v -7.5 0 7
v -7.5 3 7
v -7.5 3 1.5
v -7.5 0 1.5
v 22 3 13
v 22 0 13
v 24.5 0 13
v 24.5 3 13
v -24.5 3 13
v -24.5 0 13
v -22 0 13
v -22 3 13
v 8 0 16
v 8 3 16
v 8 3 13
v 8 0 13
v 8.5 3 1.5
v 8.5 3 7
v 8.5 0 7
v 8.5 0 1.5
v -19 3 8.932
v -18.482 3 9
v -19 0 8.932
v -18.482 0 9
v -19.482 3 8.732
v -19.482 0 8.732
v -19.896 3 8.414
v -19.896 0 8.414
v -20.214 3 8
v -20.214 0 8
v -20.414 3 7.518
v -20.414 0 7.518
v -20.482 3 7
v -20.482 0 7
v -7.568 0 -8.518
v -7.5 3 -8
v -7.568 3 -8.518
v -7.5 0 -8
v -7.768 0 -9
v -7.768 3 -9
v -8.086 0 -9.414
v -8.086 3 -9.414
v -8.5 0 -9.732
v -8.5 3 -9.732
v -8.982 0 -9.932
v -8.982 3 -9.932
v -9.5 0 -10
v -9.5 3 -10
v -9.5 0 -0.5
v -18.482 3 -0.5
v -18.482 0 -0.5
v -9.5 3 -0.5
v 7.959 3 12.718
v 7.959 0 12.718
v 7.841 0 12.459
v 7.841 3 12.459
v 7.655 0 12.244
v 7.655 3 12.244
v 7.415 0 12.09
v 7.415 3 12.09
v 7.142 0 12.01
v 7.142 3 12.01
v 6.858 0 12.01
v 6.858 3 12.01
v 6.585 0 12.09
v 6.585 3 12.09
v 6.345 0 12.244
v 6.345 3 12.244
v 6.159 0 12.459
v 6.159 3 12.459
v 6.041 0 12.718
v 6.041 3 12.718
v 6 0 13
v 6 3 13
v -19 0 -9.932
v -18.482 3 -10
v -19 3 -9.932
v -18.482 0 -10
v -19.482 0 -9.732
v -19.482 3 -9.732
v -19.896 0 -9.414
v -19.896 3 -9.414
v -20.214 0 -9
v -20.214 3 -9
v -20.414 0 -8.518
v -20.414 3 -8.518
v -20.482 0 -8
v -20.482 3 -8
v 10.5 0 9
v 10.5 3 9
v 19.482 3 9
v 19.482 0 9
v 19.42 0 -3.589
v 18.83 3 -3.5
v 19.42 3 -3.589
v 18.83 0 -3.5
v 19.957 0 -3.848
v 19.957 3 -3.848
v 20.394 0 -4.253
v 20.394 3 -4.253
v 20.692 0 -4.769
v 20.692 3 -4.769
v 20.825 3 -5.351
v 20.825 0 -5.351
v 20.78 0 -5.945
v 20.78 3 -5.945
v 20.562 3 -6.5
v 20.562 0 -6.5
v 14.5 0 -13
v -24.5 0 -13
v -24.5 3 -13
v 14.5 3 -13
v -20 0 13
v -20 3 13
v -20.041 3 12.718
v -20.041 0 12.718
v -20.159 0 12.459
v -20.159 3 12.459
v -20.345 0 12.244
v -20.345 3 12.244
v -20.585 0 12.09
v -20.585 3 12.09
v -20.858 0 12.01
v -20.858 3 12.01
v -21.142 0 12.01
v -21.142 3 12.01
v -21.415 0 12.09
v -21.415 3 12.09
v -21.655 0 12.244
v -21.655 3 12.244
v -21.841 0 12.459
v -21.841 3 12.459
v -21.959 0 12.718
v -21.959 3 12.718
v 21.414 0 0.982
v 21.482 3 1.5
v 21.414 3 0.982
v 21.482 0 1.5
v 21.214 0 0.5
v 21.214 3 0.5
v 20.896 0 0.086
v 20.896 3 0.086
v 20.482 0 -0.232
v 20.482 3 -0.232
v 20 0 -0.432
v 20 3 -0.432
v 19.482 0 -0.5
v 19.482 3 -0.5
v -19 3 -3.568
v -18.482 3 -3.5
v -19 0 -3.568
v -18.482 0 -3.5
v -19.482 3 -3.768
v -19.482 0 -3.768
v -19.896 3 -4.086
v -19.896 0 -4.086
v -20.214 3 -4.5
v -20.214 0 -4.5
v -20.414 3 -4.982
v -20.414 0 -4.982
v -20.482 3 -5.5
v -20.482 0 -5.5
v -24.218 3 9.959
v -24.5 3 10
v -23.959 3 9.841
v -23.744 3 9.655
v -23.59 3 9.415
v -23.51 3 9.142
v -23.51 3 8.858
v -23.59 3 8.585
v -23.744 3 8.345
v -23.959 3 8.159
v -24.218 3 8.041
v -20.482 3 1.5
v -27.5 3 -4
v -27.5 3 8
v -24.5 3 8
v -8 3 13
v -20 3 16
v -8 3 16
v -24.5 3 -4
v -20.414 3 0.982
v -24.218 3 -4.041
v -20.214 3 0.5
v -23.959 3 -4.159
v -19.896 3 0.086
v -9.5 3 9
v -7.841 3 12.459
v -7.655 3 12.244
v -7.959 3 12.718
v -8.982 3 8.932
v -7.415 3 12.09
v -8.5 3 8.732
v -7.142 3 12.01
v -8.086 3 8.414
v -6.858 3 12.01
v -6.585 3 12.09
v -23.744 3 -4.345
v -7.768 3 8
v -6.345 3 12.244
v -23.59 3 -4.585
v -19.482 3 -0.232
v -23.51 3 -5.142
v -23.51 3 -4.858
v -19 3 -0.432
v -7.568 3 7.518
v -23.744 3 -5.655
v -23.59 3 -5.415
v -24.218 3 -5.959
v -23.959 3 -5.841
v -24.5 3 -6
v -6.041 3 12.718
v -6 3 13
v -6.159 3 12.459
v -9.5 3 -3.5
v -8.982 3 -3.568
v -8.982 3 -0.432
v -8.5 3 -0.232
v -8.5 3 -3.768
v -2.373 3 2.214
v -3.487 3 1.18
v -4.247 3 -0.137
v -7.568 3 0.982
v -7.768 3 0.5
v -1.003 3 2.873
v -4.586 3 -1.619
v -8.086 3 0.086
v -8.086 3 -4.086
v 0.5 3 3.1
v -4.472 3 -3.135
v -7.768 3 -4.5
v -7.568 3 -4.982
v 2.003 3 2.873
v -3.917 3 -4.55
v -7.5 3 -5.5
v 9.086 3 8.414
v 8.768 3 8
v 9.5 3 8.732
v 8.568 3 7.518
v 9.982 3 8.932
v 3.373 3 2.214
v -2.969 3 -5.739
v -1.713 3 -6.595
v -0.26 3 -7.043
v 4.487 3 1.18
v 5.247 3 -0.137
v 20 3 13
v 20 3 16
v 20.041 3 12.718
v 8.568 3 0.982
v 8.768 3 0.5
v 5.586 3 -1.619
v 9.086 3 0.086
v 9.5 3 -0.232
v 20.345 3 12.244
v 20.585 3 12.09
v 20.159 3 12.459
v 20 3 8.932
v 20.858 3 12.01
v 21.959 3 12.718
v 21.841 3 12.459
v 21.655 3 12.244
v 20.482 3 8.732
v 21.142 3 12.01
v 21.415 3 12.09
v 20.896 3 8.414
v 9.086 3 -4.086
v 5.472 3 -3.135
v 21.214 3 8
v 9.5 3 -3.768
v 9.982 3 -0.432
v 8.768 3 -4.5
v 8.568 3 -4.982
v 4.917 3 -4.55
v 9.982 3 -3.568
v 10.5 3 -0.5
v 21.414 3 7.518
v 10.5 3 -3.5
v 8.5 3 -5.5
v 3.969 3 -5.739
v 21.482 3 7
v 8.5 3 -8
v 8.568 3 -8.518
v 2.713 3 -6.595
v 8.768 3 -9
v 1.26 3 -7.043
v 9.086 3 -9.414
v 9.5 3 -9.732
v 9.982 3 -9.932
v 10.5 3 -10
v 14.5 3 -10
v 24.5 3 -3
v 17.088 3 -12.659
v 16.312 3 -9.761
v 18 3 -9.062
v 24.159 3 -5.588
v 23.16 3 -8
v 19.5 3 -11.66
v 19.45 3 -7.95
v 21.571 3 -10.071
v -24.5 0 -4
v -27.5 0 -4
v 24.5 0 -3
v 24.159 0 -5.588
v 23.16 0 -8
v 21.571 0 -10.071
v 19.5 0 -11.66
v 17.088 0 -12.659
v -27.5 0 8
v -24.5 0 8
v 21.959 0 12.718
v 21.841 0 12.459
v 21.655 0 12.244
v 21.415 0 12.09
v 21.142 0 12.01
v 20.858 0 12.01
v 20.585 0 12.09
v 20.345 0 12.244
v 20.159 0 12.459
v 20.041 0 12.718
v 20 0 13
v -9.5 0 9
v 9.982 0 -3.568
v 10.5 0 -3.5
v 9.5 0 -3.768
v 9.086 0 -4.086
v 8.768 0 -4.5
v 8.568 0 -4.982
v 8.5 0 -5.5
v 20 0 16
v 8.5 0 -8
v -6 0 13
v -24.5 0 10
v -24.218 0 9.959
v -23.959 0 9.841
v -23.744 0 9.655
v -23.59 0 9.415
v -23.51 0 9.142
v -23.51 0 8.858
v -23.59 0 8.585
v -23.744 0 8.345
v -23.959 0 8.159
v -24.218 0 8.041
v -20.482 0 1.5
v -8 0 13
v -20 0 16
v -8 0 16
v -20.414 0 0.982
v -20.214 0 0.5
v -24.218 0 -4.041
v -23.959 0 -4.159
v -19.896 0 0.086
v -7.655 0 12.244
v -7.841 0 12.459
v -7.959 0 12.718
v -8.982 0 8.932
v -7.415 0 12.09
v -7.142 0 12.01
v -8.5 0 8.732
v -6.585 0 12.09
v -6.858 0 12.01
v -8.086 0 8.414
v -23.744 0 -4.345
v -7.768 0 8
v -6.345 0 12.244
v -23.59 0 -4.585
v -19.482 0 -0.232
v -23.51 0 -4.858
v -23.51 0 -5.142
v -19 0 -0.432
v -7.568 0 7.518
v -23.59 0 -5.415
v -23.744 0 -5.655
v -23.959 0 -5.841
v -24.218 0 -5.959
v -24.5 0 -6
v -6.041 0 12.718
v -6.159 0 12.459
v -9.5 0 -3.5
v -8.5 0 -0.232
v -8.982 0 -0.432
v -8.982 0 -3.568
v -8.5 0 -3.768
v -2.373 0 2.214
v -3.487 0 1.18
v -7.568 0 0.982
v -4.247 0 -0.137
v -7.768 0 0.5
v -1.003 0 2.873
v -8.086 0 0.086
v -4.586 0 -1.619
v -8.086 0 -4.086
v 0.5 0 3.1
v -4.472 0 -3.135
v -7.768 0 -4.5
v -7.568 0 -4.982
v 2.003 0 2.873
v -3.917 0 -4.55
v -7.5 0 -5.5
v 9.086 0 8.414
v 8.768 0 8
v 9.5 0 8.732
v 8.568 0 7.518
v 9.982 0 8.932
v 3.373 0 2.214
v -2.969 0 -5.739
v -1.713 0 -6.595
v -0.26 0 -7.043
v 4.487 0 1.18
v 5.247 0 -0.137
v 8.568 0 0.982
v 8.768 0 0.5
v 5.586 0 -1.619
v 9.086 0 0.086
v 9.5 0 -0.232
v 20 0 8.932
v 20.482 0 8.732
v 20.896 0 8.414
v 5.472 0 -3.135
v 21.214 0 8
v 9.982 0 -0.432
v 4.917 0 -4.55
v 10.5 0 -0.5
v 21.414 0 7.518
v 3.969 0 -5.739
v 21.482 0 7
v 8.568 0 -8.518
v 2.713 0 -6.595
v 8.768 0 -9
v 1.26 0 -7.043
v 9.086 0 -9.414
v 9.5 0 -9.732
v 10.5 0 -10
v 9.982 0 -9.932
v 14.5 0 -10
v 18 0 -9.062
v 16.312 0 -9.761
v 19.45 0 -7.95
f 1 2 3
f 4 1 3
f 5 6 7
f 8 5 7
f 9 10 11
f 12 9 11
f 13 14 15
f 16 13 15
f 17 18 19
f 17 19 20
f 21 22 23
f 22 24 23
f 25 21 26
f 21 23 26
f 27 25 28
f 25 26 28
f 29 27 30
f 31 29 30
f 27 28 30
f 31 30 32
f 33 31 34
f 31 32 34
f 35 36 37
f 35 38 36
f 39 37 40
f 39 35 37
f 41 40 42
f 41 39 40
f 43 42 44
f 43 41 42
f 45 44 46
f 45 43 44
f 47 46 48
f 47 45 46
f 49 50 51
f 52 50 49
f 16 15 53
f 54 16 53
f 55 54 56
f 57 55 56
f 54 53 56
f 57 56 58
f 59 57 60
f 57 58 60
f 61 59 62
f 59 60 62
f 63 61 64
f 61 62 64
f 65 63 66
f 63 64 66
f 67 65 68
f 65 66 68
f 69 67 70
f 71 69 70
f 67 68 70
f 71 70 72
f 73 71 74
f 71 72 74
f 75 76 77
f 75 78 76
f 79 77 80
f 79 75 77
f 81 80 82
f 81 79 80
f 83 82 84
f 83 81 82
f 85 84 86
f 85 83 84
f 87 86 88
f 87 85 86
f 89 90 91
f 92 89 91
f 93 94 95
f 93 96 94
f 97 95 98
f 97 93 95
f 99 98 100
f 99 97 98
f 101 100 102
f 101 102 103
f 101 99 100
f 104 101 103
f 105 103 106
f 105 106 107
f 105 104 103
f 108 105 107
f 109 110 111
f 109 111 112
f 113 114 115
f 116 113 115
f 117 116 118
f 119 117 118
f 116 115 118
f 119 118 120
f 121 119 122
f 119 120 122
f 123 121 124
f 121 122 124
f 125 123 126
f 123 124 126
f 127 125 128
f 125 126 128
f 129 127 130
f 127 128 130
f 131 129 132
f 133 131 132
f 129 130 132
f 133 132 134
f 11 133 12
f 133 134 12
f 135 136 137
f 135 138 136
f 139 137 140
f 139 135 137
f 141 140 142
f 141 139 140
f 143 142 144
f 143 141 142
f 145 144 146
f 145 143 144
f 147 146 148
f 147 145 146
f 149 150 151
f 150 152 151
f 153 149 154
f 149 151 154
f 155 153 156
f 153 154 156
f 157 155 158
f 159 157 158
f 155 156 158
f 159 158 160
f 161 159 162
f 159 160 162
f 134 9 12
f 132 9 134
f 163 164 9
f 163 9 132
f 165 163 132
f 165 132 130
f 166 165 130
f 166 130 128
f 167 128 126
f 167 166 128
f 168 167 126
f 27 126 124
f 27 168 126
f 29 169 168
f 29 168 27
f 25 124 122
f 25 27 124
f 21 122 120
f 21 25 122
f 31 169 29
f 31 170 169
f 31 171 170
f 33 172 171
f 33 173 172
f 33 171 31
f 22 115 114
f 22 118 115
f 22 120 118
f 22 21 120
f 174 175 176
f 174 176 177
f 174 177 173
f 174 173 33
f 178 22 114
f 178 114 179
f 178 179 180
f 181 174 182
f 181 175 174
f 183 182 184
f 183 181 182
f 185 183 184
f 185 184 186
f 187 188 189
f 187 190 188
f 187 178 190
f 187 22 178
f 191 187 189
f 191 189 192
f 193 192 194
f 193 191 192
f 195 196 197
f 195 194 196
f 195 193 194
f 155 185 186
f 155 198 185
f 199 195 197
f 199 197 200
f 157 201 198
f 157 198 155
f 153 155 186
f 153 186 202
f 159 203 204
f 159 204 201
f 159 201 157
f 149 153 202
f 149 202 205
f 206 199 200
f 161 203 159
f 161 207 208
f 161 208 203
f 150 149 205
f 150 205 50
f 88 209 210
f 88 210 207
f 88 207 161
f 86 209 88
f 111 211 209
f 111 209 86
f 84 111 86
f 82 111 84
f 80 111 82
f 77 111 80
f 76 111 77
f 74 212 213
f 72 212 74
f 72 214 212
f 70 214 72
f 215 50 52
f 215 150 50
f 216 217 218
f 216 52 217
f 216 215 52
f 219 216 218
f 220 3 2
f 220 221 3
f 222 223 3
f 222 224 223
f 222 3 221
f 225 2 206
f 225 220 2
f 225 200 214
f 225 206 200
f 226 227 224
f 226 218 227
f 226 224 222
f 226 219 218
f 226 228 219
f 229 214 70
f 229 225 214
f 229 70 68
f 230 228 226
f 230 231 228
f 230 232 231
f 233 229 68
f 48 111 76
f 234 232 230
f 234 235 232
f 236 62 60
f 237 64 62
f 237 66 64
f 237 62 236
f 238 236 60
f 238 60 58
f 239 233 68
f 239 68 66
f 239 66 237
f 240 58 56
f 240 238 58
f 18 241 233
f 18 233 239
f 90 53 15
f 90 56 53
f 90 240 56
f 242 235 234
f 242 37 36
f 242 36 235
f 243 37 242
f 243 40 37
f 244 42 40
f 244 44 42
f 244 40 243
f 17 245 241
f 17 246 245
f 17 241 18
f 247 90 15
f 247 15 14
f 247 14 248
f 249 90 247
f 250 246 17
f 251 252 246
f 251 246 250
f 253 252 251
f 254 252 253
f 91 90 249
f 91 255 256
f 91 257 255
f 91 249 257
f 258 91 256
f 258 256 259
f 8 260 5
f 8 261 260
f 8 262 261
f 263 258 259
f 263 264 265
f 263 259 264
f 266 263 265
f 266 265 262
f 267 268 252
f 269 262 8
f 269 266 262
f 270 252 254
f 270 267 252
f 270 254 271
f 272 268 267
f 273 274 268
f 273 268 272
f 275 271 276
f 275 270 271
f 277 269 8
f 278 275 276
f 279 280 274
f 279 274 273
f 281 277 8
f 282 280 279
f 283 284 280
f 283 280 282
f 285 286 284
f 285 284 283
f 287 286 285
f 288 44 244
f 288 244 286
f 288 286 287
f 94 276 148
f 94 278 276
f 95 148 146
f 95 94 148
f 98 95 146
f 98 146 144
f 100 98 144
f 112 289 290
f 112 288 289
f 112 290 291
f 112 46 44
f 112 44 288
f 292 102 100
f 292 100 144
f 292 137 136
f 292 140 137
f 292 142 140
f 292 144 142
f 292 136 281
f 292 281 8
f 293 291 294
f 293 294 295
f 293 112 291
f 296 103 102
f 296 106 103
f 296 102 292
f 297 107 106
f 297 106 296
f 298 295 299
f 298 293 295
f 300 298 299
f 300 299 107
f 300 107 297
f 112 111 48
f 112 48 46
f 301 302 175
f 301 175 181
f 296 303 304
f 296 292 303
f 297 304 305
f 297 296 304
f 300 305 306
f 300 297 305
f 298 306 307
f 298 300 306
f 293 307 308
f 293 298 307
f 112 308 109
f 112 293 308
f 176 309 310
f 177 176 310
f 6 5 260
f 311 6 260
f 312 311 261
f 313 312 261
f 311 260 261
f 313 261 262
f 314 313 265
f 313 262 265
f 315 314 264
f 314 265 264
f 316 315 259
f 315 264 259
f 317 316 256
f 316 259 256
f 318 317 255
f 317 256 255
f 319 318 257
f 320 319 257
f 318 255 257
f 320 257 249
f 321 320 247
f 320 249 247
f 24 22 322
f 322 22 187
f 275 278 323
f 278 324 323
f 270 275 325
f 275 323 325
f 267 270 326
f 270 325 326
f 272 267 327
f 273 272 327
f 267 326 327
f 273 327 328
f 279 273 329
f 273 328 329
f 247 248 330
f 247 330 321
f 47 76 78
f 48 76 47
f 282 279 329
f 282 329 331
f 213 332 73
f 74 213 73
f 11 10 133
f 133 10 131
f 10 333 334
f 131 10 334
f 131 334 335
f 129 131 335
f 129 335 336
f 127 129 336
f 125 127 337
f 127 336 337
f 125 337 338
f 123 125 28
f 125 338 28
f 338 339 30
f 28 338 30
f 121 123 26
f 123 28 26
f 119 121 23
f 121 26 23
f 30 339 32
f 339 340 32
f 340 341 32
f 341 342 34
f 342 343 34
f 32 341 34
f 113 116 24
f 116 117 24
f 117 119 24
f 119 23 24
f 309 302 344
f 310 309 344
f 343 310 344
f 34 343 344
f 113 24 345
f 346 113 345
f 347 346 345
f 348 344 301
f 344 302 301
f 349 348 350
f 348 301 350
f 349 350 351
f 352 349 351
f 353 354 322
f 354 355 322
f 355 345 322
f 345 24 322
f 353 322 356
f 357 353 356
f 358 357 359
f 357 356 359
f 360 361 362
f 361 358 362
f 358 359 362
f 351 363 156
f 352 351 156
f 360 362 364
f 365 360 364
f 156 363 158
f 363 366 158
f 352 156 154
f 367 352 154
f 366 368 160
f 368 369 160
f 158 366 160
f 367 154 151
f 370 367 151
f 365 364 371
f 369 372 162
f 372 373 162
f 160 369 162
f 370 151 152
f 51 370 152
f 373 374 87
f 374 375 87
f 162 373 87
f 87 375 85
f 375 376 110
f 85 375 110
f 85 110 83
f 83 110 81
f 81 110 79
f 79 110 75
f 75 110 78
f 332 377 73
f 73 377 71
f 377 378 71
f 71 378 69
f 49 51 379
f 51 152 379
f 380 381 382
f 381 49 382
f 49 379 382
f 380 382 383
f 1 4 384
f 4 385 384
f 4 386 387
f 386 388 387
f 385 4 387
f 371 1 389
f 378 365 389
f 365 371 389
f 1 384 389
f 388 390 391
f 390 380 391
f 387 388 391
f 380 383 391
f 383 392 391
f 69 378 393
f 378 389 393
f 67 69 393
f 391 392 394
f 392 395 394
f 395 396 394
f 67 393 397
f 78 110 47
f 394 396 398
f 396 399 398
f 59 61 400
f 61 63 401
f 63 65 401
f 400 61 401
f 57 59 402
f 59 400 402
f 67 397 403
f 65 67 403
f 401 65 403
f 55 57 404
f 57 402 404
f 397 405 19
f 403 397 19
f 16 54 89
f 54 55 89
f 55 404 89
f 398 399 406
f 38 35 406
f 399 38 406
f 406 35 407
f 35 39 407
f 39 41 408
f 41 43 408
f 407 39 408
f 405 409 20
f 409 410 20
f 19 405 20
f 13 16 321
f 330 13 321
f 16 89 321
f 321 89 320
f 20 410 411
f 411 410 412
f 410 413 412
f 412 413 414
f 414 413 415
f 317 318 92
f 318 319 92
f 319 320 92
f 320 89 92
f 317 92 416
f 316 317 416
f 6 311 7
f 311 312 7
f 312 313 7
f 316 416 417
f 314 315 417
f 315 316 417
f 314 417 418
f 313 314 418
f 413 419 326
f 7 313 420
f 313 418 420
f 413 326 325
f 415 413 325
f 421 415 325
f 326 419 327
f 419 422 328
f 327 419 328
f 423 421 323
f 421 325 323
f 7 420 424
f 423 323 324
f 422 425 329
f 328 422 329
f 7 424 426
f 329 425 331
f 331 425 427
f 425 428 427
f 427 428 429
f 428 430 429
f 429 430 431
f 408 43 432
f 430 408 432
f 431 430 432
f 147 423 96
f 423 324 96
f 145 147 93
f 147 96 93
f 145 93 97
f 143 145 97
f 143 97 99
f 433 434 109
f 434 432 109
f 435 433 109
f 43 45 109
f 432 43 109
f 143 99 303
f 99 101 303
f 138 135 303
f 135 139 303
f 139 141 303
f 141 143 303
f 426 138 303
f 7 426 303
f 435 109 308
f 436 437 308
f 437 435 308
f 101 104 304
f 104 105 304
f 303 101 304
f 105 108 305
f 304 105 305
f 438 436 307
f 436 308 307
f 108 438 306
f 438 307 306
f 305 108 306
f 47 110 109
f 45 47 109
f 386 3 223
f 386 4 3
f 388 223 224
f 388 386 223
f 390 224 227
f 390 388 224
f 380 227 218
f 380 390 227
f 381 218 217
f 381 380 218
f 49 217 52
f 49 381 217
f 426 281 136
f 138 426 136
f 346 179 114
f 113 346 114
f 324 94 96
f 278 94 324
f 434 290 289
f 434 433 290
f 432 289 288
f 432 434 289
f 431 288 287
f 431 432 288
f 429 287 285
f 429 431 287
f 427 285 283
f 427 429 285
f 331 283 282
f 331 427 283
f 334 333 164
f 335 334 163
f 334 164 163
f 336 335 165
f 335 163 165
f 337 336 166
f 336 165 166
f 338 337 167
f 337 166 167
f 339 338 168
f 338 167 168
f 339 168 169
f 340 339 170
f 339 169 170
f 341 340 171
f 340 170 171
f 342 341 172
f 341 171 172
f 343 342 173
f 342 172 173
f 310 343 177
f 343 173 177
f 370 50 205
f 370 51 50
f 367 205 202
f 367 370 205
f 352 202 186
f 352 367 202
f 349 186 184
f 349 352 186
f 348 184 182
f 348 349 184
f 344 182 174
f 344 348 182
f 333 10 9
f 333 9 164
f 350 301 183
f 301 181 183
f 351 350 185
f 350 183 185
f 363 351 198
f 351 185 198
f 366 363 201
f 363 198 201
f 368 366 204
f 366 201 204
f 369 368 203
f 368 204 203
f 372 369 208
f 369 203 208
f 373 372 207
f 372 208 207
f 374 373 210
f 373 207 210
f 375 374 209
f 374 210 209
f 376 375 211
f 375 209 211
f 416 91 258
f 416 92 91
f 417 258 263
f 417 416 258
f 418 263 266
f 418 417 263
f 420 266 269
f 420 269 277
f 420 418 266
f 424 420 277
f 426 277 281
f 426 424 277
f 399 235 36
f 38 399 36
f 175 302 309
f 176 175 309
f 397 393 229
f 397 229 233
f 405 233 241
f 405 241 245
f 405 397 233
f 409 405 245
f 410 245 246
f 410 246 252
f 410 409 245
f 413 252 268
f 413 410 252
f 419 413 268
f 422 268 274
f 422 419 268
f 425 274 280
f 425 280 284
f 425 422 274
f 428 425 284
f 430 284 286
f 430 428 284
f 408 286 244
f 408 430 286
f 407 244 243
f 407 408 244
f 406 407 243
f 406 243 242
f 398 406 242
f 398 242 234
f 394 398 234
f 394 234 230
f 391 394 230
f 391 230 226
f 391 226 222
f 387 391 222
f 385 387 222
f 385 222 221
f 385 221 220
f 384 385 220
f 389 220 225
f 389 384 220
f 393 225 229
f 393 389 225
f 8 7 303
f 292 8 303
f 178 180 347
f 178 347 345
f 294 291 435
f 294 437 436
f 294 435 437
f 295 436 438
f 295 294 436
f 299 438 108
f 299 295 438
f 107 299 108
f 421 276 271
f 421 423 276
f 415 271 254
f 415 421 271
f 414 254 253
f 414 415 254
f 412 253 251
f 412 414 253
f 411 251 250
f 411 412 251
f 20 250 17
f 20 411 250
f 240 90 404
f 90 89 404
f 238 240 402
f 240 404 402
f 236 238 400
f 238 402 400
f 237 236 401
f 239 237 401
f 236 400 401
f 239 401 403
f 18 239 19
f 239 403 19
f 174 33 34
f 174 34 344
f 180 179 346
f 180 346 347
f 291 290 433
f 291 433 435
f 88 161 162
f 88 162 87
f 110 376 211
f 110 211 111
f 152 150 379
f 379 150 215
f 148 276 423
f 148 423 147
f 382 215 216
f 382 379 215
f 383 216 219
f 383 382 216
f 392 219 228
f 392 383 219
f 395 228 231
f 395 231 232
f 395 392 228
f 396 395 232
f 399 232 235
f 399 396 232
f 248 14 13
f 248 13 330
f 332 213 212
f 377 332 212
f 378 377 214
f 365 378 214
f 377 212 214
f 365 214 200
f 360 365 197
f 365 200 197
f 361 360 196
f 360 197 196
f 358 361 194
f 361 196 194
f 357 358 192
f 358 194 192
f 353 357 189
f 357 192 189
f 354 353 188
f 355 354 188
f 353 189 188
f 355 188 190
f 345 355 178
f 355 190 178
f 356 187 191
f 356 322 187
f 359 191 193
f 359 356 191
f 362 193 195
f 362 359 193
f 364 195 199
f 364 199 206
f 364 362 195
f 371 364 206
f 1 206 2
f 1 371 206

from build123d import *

# Parameters (mm, degrees)
SKETCH_1_W          = 49
SKETCH_1_H          = 26
SKETCH_1_R          = 5.1
EXTRUDE_1_DEPTH     = 3
SKETCH_5_W          = 3
SKETCH_5_H          = 12
EXTRUDE_2_DEPTH     = 3
SKETCH_2_W          = 12
SKETCH_2_H          = 3
EXTRUDE_3_DEPTH     = 3
SKETCH_8_R          = 1
CUT_EXTRUDE_5_DEPTH = 32.957002363
FILLET_1_R          = 10
SKETCH_6_W          = 12.982120022
SKETCH_6_H          = 9.5
SKETCH_6_H_2        = 6.5
CUT_EXTRUDE_3_DEPTH = 32.957002363
FILLET_2_R          = 2


with BuildPart() as part:
    # 草图1 → 凸台-拉伸1 (new body)
    with BuildSketch(Plane(origin=(0, 0, 0), x_dir=(1, 0, 0), z_dir=(0, 1, 0))):
        Rectangle(SKETCH_1_W, SKETCH_1_H)
        with Locations(Location((0.5, 2, 0), (0, 0, 270))):
            Circle(SKETCH_1_R, mode=Mode.SUBTRACT)
    extrude(amount=EXTRUDE_1_DEPTH)

    # 草图5 → 凸台-拉伸2 (add)
    with BuildSketch(Plane.XZ):
        with Locations((-26, 2)):
            Rectangle(SKETCH_5_W, SKETCH_5_H)
    extrude(amount=-EXTRUDE_2_DEPTH)

    # 草图2 → 凸台-拉伸3 (add)
    with BuildSketch(Plane(origin=(0, 3, 0), x_dir=(1, 0, 0), z_dir=(0, 1, 0))):
        with Locations((-14, -14.5)):
            Rectangle(SKETCH_2_W, SKETCH_2_H)
        with Locations((14, -14.5)):
            Rectangle(SKETCH_2_W, SKETCH_2_H)
    extrude(amount=-EXTRUDE_3_DEPTH)

    # 草图8 → 切除-拉伸5 (cut, through all)
    with BuildSketch(Plane(origin=(0, 3, 0), x_dir=(1, 0, 0), z_dir=(0, 1, 0))):
        with Locations((21, -13)):
            Circle(SKETCH_8_R)
        with Locations((7, -13)):
            Circle(SKETCH_8_R)
        with Locations((-7, -13)):
            Circle(SKETCH_8_R)
        with Locations((-21, -13)):
            Circle(SKETCH_8_R)
        with Locations((-24.5, -9)):
            Circle(SKETCH_8_R)
        with Locations((-24.5, 5)):
            Circle(SKETCH_8_R)
    extrude(amount=-CUT_EXTRUDE_5_DEPTH, mode=Mode.SUBTRACT)

    # 圆角1
    fillet_1_edges = [part.edges().sort_by_distance(p)[0] for p in [
        (24.5, 1.5, -13),
    ]]
    fillet(fillet_1_edges, radius=FILLET_1_R)

    # 草图6 → 切除-拉伸3 (cut, through all)
    with BuildSketch(Plane(origin=(0, 3, 0), x_dir=(1, 0, 0), z_dir=(0, 1, 0))):
        with Locations((-13.991060011, -4.25)):
            Rectangle(SKETCH_6_W, SKETCH_6_H)
        with Locations((-13.991060011, 6.75)):
            Rectangle(SKETCH_6_W, SKETCH_6_H_2)
        with Locations((14.991060011, -4.25)):
            Rectangle(SKETCH_6_W, SKETCH_6_H)
        with BuildLine():
            Line((8.5, 3.5), (8.5, 10))
            Line((8.5, 10), (14.5, 10))
            ThreePointArc((14.5, 10), (19.269696007, 8.123475383), (21.482120022, 3.5))
            Line((21.482120022, 3.5), (8.5, 3.5))
        make_face()
    extrude(amount=-CUT_EXTRUDE_3_DEPTH, mode=Mode.SUBTRACT)

    # 圆角2
    fillet_2_edges = [part.edges().sort_by_distance(p)[0] for p in [
        (-20.482120022, 1.5, -3.5),
        (-20.482120022, 1.5, -10),
        (-7.5, 1.5, -10),
        (-7.5, 1.5, -3.5),
        (21.482120022, 1.5, -0.5),
        (21.482120022, 1.5, 9),
        (8.5, 1.5, 9),
        (8.5, 1.5, -0.5),
        (8.5, 1.5, -10),
        (21.482120022, 1.5, -3.5),
        (8.5, 1.5, -3.5),
        (-20.482120022, 1.5, 9),
        (-20.482120022, 1.5, -0.5),
        (-7.5, 1.5, -0.5),
        (-7.5, 1.5, 9),
    ]]
    fillet(fillet_2_edges, radius=FILLET_2_R)


solid = part.part
